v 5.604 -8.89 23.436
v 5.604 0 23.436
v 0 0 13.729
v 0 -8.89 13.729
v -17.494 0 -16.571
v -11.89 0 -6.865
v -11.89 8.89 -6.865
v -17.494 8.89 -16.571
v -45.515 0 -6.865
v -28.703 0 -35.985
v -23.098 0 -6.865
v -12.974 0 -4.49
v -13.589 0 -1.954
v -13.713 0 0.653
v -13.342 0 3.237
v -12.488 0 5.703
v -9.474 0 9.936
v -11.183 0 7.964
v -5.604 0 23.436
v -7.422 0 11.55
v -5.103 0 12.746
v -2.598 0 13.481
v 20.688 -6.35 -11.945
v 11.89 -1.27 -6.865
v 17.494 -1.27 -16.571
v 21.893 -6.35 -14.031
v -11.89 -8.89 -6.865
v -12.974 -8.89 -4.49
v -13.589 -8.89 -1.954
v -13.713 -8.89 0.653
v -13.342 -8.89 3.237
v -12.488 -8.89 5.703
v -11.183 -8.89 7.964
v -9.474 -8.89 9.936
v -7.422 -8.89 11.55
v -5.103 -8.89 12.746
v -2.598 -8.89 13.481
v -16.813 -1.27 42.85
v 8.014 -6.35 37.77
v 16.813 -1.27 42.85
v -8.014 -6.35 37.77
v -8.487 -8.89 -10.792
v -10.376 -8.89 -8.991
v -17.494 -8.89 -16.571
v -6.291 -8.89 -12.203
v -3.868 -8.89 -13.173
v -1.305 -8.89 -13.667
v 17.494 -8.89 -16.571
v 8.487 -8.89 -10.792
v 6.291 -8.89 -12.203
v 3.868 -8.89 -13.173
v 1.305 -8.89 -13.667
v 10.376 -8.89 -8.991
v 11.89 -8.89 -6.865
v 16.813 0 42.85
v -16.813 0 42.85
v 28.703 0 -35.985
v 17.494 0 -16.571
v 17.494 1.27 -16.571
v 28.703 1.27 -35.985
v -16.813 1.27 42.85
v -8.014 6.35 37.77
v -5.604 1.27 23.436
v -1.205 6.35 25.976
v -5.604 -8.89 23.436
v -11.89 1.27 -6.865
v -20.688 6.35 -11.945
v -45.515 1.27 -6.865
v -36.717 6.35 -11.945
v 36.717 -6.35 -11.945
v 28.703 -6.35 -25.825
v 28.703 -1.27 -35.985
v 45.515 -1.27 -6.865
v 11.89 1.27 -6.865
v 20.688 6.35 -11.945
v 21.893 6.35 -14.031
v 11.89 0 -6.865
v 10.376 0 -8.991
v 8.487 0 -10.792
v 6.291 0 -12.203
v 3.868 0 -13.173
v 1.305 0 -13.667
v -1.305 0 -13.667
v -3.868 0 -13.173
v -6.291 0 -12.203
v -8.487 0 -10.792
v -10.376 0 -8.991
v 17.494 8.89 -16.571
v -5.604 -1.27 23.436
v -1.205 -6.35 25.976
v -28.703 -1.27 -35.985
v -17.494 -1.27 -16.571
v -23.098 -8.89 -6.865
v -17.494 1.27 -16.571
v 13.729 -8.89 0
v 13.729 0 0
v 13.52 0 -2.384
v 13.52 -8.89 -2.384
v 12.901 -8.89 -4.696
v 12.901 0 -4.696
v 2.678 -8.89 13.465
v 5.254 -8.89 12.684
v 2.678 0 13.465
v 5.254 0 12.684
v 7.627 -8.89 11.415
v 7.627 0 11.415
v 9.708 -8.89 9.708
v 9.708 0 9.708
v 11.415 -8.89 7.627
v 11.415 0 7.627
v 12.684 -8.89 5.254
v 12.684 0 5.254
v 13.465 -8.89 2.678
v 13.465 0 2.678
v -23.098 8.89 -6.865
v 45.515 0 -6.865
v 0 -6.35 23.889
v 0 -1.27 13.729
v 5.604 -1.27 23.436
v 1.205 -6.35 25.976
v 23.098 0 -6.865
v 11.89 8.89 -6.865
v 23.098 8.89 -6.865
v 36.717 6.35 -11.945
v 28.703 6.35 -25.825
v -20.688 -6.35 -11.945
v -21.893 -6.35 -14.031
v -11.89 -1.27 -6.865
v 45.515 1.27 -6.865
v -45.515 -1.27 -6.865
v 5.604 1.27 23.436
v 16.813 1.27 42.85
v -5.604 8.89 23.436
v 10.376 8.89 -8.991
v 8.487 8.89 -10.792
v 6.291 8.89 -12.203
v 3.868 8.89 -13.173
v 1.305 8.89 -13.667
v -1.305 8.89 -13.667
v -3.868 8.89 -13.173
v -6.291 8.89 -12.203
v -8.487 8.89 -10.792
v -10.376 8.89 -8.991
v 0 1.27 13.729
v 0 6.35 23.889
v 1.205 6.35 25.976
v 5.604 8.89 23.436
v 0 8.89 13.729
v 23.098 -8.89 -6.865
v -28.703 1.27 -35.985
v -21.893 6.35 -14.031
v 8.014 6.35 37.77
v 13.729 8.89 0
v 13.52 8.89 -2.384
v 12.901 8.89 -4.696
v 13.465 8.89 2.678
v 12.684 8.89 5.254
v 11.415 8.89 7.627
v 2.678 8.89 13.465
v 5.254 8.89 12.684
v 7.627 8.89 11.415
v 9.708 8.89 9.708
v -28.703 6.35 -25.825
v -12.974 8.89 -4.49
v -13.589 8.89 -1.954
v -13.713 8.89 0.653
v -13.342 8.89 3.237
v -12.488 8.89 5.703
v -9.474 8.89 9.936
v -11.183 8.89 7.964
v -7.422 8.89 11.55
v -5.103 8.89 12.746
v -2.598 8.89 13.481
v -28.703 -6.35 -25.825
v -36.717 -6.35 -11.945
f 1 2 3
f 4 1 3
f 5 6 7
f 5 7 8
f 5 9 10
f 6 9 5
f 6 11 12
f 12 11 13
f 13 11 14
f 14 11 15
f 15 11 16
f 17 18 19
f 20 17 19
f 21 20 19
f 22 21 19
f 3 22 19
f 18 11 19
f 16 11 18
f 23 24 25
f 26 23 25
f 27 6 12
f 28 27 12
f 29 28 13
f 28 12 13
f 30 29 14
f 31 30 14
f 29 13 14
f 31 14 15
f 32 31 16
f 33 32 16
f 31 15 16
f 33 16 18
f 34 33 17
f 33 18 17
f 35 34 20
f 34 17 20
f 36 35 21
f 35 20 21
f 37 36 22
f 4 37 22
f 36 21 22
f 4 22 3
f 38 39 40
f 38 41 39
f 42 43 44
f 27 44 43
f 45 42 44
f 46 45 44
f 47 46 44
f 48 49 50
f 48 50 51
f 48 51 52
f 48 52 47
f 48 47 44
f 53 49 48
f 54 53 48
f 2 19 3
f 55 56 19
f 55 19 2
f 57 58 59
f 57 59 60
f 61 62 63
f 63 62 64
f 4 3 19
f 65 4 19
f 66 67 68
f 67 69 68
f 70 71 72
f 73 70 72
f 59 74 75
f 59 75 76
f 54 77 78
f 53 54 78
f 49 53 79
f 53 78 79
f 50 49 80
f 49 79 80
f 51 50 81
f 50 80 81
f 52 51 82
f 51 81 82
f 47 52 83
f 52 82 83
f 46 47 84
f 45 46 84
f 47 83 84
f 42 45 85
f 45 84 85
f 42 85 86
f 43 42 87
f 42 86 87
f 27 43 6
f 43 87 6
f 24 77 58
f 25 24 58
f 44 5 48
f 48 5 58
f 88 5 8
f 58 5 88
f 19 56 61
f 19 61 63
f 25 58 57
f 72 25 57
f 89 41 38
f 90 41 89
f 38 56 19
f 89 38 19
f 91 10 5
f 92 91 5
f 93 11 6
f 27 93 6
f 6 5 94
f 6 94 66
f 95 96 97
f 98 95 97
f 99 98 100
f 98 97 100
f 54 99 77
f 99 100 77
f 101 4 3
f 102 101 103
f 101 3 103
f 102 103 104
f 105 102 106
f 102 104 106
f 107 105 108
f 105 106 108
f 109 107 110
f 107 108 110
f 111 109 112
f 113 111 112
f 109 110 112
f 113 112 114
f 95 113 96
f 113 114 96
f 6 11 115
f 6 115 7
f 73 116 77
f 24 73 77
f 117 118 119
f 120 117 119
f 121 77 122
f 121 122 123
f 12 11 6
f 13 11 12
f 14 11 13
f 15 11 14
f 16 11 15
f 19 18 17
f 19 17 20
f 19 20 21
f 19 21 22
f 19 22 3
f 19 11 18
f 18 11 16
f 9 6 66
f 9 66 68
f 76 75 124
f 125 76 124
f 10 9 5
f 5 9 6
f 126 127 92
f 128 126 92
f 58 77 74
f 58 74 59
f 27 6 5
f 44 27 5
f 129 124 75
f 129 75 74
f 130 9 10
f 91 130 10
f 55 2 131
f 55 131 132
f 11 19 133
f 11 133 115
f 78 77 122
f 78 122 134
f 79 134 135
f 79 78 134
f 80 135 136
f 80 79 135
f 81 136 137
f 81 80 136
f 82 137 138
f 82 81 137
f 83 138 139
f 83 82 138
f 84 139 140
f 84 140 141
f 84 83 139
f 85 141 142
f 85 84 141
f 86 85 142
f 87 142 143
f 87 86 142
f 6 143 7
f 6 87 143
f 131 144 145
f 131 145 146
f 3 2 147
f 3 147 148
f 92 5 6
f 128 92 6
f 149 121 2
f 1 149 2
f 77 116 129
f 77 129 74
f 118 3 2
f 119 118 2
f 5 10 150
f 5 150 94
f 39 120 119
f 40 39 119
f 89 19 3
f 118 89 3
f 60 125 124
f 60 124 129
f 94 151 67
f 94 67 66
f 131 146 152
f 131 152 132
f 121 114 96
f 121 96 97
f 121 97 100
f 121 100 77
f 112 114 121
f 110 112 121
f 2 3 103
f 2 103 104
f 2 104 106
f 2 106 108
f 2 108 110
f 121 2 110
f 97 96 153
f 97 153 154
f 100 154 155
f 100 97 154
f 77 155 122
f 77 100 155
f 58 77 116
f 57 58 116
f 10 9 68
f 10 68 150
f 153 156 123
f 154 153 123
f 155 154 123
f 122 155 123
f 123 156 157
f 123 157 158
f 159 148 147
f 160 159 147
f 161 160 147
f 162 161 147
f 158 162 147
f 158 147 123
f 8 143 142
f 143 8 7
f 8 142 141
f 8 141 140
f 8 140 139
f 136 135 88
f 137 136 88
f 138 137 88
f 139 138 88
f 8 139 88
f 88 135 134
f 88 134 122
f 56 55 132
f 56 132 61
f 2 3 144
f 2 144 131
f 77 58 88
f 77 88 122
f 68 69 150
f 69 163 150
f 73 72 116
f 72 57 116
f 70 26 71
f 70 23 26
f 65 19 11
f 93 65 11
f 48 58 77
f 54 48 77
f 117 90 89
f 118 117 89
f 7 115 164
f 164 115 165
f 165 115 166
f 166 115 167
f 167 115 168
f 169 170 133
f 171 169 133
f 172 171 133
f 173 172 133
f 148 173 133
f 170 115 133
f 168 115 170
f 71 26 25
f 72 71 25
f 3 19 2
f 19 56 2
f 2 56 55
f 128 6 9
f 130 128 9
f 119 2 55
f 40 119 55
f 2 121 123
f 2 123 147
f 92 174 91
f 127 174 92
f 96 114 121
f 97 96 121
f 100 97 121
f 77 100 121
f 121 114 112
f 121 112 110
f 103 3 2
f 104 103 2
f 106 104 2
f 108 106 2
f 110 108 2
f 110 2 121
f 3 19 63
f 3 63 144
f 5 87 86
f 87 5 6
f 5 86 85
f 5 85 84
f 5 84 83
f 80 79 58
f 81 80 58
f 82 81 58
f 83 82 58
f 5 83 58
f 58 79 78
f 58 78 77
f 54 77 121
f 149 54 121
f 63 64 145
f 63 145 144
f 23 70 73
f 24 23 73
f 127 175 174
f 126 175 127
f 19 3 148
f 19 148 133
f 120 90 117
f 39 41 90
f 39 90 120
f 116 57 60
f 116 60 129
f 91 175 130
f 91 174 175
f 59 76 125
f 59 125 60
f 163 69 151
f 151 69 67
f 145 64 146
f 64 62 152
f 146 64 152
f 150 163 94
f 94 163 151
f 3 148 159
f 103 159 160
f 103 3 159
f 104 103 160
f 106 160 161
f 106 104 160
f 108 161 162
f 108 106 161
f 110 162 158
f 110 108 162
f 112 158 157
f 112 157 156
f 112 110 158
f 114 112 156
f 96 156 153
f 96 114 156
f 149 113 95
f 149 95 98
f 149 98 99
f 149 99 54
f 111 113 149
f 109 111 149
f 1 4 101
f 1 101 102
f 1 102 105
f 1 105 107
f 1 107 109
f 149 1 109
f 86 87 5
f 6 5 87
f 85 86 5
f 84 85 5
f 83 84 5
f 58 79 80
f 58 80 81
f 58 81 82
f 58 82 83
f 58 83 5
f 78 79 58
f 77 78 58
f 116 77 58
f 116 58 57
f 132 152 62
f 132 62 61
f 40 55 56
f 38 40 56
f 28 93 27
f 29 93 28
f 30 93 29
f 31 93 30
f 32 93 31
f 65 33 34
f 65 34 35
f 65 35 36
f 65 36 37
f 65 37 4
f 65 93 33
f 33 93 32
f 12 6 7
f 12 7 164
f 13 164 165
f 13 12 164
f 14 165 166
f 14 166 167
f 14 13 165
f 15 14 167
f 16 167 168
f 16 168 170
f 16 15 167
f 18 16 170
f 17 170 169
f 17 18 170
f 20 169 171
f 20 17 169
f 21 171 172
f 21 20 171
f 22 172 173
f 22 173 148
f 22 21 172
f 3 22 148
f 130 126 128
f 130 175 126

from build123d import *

# Parameters (mm, degrees)
F1_DEPTH  = 6.35
F2_DEPTH  = 8.89
F3_SIZE   = 5.08
F3_2_SIZE = 5.08
F3_3_SIZE = 5.08
F4_SIZE   = 5.08
F5_DEPTH  = 6.35
F6_SIZE   = 5.08
F6_2_SIZE = 5.08
F6_3_SIZE = 5.08
F7_DEPTH  = 8.89


with BuildPart() as f1:
    # F0 (on Front) → F1 (new body)
    with BuildSketch(Plane.XZ):
        Polygon((45.5153971005, -6.864500683), (23.0982416679, -6.864500683), (28.702530526, -16.5714137256), (17.4939528097, -16.5714137256), (28.702530526, -35.9852398108), align=None)
        Polygon((28.702530526, -16.5714137256), (23.0982416679, -6.864500683), (11.8896639515, -6.864500683), align=None)
        Polygon((17.4939528097, -16.5714137256), (28.702530526, -16.5714137256), (11.8896639515, -6.864500683), align=None)
    extrude(amount=F1_DEPTH)

    # F3#2
    f3_2_edges = [f1.edges().sort_by_distance(p)[0] for p in [
        (28.702531, -6.35, -6.864501),
        (20.296097, -6.35, -21.42487),
    ]]
    chamfer(f3_2_edges, length=F3_2_SIZE)

    # F4
    f4_edges = [f1.edges().sort_by_distance(p)[0] for p in [
        (37.108964, -6.35, -21.42487),
    ]]
    chamfer(f4_edges, length=F4_SIZE)


with BuildPart() as f1b:
    # F0 (on Front) → F1, piece 2 (new body)
    with BuildSketch(Plane.XZ):
        Polygon((-28.702530526, -16.5714137256), (-23.0982416679, -6.864500683), (-45.5153971005, -6.864500683), (-28.702530526, -35.9852398108), (-17.4939528097, -16.5714137256), align=None)
        Polygon((-11.8896639515, -6.864500683), (-23.0982416679, -6.864500683), (-28.702530526, -16.5714137256), align=None)
        Polygon((-17.4939528097, -16.5714137256), (-11.8896639515, -6.864500683), (-28.702530526, -16.5714137256), align=None)
    extrude(amount=F1_DEPTH)

    # F3#3
    f3_3_edges = [f1b.edges().sort_by_distance(p)[0] for p in [
        (-20.296097, -6.35, -21.42487),
        (-28.702531, -6.35, -6.864501),
        (-37.108964, -6.35, -21.42487),
    ]]
    chamfer(f3_3_edges, length=F3_3_SIZE)


with BuildPart() as f1c:
    # F0 (on Front) → F1, piece 3 (new body)
    with BuildSketch(Plane.XZ):
        Polygon((5.6042888582, 23.4359144086), (0, 33.1428274512), (0, 13.729001366), align=None)
        Polygon((0, 13.729001366), (0, 33.1428274512), (-5.6042888582, 23.4359144086), align=None)
        Polygon((-5.6042888582, 23.4359144086), (0, 33.1428274512), (5.6042888582, 23.4359144086), (16.8128665745, 42.8497404938), (-16.8128665745, 42.8497404938), align=None)
    extrude(amount=F1_DEPTH)

    # F3
    f3_edges = [f1c.edges().sort_by_distance(p)[0] for p in [
        (-8.406433, -6.35, 28.289371),
        (8.406433, -6.35, 28.289371),
        (0, -6.35, 42.84974),
    ]]
    chamfer(f3_edges, length=F3_SIZE)


with BuildPart() as f2:
    # F0 (on Front) → F2 (new body)
    with BuildSketch(Plane.XZ):
        with BuildLine():
            Line((23.0982416679, -6.864500683), (5.6042888582, 23.4359144086))
            Line((5.6042888582, 23.4359144086), (0, 13.729001366))
            ThreePointArc((0, 13.729001366), (9.7078699648, 9.7078699648), (13.729001366, 0))
            ThreePointArc((13.729001366, 0), (13.2611969886, -3.5533270238), (11.8896639515, -6.864500683))
            Line((11.8896639515, -6.864500683), (23.0982416679, -6.864500683))
        make_face()
    extrude(amount=F2_DEPTH)


with BuildPart() as f2b:
    # F0 (on Front) → F2, piece 2 (new body)
    with BuildSketch(Plane.XZ):
        with BuildLine():
            ThreePointArc((11.8896639515, -6.864500683), (0, -13.729001366), (-11.8896639515, -6.864500683))
            Line((-11.8896639515, -6.864500683), (-17.4939528097, -16.5714137256))
            Line((-17.4939528097, -16.5714137256), (17.4939528097, -16.5714137256))
            Line((17.4939528097, -16.5714137256), (11.8896639515, -6.864500683))
        make_face()
    extrude(amount=F2_DEPTH)


with BuildPart() as f2c:
    # F0 (on Front) → F2, piece 3 (new body)
    with BuildSketch(Plane.XZ):
        with BuildLine():
            Line((0, 13.729001366), (-5.6042888582, 23.4359144086))
            Line((-5.6042888582, 23.4359144086), (-23.0982416679, -6.864500683))
            Line((-23.0982416679, -6.864500683), (-11.8896639515, -6.864500683))
            ThreePointArc((-11.8896639515, -6.864500683), (-11.8896639515, 6.864500683), (0, 13.729001366))
        make_face()
    extrude(amount=F2_DEPTH)


with BuildPart() as f5:
    # F0 (on Front) → F5 (new body)
    with BuildSketch(Plane.XZ):
        Polygon((45.5153971005, -6.864500683), (23.0982416679, -6.864500683), (28.702530526, -16.5714137256), (17.4939528097, -16.5714137256), (28.702530526, -35.9852398108), align=None)
        Polygon((17.4939528097, -16.5714137256), (28.702530526, -16.5714137256), (11.8896639515, -6.864500683), align=None)
        Polygon((28.702530526, -16.5714137256), (23.0982416679, -6.864500683), (11.8896639515, -6.864500683), align=None)
    extrude(amount=-F5_DEPTH)

    # F6
    f6_edges = [f5.edges().sort_by_distance(p)[0] for p in [
        (37.108964, 6.35, -21.42487),
        (28.702531, 6.35, -6.864501),
        (20.296097, 6.35, -21.42487),
    ]]
    chamfer(f6_edges, length=F6_SIZE)


with BuildPart() as f5b:
    # F0 (on Front) → F5, piece 2 (new body)
    with BuildSketch(Plane.XZ):
        Polygon((-28.702530526, -16.5714137256), (-23.0982416679, -6.864500683), (-45.5153971005, -6.864500683), (-28.702530526, -35.9852398108), (-17.4939528097, -16.5714137256), align=None)
        Polygon((-17.4939528097, -16.5714137256), (-11.8896639515, -6.864500683), (-28.702530526, -16.5714137256), align=None)
        Polygon((-11.8896639515, -6.864500683), (-23.0982416679, -6.864500683), (-28.702530526, -16.5714137256), align=None)
    extrude(amount=-F5_DEPTH)

    # F6#2
    f6_2_edges = [f5b.edges().sort_by_distance(p)[0] for p in [
        (-20.296097, 6.35, -21.42487),
        (-37.108964, 6.35, -21.42487),
        (-28.702531, 6.35, -6.864501),
    ]]
    chamfer(f6_2_edges, length=F6_2_SIZE)


with BuildPart() as f5c:
    # F0 (on Front) → F5, piece 3 (new body)
    with BuildSketch(Plane.XZ):
        Polygon((-5.6042888582, 23.4359144086), (0, 33.1428274512), (5.6042888582, 23.4359144086), (16.8128665745, 42.8497404938), (-16.8128665745, 42.8497404938), align=None)
        Polygon((0, 13.729001366), (0, 33.1428274512), (-5.6042888582, 23.4359144086), align=None)
        Polygon((5.6042888582, 23.4359144086), (0, 33.1428274512), (0, 13.729001366), align=None)
    extrude(amount=-F5_DEPTH)

    # F6#3
    f6_3_edges = [f5c.edges().sort_by_distance(p)[0] for p in [
        (-8.406433, 6.35, 28.289371),
        (0, 6.35, 42.84974),
        (8.406433, 6.35, 28.289371),
    ]]
    chamfer(f6_3_edges, length=F6_3_SIZE)


with BuildPart() as f7:
    # F0 (on Front) → F7 (new body)
    with BuildSketch(Plane.XZ):
        with BuildLine():
            Line((0, 13.729001366), (-5.6042888582, 23.4359144086))
            Line((-5.6042888582, 23.4359144086), (-23.0982416679, -6.864500683))
            Line((-23.0982416679, -6.864500683), (-11.8896639515, -6.864500683))
            ThreePointArc((-11.8896639515, -6.864500683), (-11.8896639515, 6.864500683), (0, 13.729001366))
        make_face()
    extrude(amount=-F7_DEPTH)


with BuildPart() as f7b:
    # F0 (on Front) → F7, piece 2 (new body)
    with BuildSketch(Plane.XZ):
        with BuildLine():
            ThreePointArc((11.8896639515, -6.864500683), (0, -13.729001366), (-11.8896639515, -6.864500683))
            Line((-11.8896639515, -6.864500683), (-17.4939528097, -16.5714137256))
            Line((-17.4939528097, -16.5714137256), (17.4939528097, -16.5714137256))
            Line((17.4939528097, -16.5714137256), (11.8896639515, -6.864500683))
        make_face()
    extrude(amount=-F7_DEPTH)


with BuildPart() as f7c:
    # F0 (on Front) → F7, piece 3 (new body)
    with BuildSketch(Plane.XZ):
        with BuildLine():
            Line((23.0982416679, -6.864500683), (5.6042888582, 23.4359144086))
            Line((5.6042888582, 23.4359144086), (0, 13.729001366))
            ThreePointArc((0, 13.729001366), (9.7078699648, 9.7078699648), (13.729001366, 0))
            ThreePointArc((13.729001366, 0), (13.2611969886, -3.5533270238), (11.8896639515, -6.864500683))
            Line((11.8896639515, -6.864500683), (23.0982416679, -6.864500683))
        make_face()
    extrude(amount=-F7_DEPTH)


solid = Compound([f1.part, f1b.part, f1c.part, f2.part, f2b.part, f2c.part, f5.part, f5b.part, f5c.part, f7.part, f7b.part, f7c.part])
